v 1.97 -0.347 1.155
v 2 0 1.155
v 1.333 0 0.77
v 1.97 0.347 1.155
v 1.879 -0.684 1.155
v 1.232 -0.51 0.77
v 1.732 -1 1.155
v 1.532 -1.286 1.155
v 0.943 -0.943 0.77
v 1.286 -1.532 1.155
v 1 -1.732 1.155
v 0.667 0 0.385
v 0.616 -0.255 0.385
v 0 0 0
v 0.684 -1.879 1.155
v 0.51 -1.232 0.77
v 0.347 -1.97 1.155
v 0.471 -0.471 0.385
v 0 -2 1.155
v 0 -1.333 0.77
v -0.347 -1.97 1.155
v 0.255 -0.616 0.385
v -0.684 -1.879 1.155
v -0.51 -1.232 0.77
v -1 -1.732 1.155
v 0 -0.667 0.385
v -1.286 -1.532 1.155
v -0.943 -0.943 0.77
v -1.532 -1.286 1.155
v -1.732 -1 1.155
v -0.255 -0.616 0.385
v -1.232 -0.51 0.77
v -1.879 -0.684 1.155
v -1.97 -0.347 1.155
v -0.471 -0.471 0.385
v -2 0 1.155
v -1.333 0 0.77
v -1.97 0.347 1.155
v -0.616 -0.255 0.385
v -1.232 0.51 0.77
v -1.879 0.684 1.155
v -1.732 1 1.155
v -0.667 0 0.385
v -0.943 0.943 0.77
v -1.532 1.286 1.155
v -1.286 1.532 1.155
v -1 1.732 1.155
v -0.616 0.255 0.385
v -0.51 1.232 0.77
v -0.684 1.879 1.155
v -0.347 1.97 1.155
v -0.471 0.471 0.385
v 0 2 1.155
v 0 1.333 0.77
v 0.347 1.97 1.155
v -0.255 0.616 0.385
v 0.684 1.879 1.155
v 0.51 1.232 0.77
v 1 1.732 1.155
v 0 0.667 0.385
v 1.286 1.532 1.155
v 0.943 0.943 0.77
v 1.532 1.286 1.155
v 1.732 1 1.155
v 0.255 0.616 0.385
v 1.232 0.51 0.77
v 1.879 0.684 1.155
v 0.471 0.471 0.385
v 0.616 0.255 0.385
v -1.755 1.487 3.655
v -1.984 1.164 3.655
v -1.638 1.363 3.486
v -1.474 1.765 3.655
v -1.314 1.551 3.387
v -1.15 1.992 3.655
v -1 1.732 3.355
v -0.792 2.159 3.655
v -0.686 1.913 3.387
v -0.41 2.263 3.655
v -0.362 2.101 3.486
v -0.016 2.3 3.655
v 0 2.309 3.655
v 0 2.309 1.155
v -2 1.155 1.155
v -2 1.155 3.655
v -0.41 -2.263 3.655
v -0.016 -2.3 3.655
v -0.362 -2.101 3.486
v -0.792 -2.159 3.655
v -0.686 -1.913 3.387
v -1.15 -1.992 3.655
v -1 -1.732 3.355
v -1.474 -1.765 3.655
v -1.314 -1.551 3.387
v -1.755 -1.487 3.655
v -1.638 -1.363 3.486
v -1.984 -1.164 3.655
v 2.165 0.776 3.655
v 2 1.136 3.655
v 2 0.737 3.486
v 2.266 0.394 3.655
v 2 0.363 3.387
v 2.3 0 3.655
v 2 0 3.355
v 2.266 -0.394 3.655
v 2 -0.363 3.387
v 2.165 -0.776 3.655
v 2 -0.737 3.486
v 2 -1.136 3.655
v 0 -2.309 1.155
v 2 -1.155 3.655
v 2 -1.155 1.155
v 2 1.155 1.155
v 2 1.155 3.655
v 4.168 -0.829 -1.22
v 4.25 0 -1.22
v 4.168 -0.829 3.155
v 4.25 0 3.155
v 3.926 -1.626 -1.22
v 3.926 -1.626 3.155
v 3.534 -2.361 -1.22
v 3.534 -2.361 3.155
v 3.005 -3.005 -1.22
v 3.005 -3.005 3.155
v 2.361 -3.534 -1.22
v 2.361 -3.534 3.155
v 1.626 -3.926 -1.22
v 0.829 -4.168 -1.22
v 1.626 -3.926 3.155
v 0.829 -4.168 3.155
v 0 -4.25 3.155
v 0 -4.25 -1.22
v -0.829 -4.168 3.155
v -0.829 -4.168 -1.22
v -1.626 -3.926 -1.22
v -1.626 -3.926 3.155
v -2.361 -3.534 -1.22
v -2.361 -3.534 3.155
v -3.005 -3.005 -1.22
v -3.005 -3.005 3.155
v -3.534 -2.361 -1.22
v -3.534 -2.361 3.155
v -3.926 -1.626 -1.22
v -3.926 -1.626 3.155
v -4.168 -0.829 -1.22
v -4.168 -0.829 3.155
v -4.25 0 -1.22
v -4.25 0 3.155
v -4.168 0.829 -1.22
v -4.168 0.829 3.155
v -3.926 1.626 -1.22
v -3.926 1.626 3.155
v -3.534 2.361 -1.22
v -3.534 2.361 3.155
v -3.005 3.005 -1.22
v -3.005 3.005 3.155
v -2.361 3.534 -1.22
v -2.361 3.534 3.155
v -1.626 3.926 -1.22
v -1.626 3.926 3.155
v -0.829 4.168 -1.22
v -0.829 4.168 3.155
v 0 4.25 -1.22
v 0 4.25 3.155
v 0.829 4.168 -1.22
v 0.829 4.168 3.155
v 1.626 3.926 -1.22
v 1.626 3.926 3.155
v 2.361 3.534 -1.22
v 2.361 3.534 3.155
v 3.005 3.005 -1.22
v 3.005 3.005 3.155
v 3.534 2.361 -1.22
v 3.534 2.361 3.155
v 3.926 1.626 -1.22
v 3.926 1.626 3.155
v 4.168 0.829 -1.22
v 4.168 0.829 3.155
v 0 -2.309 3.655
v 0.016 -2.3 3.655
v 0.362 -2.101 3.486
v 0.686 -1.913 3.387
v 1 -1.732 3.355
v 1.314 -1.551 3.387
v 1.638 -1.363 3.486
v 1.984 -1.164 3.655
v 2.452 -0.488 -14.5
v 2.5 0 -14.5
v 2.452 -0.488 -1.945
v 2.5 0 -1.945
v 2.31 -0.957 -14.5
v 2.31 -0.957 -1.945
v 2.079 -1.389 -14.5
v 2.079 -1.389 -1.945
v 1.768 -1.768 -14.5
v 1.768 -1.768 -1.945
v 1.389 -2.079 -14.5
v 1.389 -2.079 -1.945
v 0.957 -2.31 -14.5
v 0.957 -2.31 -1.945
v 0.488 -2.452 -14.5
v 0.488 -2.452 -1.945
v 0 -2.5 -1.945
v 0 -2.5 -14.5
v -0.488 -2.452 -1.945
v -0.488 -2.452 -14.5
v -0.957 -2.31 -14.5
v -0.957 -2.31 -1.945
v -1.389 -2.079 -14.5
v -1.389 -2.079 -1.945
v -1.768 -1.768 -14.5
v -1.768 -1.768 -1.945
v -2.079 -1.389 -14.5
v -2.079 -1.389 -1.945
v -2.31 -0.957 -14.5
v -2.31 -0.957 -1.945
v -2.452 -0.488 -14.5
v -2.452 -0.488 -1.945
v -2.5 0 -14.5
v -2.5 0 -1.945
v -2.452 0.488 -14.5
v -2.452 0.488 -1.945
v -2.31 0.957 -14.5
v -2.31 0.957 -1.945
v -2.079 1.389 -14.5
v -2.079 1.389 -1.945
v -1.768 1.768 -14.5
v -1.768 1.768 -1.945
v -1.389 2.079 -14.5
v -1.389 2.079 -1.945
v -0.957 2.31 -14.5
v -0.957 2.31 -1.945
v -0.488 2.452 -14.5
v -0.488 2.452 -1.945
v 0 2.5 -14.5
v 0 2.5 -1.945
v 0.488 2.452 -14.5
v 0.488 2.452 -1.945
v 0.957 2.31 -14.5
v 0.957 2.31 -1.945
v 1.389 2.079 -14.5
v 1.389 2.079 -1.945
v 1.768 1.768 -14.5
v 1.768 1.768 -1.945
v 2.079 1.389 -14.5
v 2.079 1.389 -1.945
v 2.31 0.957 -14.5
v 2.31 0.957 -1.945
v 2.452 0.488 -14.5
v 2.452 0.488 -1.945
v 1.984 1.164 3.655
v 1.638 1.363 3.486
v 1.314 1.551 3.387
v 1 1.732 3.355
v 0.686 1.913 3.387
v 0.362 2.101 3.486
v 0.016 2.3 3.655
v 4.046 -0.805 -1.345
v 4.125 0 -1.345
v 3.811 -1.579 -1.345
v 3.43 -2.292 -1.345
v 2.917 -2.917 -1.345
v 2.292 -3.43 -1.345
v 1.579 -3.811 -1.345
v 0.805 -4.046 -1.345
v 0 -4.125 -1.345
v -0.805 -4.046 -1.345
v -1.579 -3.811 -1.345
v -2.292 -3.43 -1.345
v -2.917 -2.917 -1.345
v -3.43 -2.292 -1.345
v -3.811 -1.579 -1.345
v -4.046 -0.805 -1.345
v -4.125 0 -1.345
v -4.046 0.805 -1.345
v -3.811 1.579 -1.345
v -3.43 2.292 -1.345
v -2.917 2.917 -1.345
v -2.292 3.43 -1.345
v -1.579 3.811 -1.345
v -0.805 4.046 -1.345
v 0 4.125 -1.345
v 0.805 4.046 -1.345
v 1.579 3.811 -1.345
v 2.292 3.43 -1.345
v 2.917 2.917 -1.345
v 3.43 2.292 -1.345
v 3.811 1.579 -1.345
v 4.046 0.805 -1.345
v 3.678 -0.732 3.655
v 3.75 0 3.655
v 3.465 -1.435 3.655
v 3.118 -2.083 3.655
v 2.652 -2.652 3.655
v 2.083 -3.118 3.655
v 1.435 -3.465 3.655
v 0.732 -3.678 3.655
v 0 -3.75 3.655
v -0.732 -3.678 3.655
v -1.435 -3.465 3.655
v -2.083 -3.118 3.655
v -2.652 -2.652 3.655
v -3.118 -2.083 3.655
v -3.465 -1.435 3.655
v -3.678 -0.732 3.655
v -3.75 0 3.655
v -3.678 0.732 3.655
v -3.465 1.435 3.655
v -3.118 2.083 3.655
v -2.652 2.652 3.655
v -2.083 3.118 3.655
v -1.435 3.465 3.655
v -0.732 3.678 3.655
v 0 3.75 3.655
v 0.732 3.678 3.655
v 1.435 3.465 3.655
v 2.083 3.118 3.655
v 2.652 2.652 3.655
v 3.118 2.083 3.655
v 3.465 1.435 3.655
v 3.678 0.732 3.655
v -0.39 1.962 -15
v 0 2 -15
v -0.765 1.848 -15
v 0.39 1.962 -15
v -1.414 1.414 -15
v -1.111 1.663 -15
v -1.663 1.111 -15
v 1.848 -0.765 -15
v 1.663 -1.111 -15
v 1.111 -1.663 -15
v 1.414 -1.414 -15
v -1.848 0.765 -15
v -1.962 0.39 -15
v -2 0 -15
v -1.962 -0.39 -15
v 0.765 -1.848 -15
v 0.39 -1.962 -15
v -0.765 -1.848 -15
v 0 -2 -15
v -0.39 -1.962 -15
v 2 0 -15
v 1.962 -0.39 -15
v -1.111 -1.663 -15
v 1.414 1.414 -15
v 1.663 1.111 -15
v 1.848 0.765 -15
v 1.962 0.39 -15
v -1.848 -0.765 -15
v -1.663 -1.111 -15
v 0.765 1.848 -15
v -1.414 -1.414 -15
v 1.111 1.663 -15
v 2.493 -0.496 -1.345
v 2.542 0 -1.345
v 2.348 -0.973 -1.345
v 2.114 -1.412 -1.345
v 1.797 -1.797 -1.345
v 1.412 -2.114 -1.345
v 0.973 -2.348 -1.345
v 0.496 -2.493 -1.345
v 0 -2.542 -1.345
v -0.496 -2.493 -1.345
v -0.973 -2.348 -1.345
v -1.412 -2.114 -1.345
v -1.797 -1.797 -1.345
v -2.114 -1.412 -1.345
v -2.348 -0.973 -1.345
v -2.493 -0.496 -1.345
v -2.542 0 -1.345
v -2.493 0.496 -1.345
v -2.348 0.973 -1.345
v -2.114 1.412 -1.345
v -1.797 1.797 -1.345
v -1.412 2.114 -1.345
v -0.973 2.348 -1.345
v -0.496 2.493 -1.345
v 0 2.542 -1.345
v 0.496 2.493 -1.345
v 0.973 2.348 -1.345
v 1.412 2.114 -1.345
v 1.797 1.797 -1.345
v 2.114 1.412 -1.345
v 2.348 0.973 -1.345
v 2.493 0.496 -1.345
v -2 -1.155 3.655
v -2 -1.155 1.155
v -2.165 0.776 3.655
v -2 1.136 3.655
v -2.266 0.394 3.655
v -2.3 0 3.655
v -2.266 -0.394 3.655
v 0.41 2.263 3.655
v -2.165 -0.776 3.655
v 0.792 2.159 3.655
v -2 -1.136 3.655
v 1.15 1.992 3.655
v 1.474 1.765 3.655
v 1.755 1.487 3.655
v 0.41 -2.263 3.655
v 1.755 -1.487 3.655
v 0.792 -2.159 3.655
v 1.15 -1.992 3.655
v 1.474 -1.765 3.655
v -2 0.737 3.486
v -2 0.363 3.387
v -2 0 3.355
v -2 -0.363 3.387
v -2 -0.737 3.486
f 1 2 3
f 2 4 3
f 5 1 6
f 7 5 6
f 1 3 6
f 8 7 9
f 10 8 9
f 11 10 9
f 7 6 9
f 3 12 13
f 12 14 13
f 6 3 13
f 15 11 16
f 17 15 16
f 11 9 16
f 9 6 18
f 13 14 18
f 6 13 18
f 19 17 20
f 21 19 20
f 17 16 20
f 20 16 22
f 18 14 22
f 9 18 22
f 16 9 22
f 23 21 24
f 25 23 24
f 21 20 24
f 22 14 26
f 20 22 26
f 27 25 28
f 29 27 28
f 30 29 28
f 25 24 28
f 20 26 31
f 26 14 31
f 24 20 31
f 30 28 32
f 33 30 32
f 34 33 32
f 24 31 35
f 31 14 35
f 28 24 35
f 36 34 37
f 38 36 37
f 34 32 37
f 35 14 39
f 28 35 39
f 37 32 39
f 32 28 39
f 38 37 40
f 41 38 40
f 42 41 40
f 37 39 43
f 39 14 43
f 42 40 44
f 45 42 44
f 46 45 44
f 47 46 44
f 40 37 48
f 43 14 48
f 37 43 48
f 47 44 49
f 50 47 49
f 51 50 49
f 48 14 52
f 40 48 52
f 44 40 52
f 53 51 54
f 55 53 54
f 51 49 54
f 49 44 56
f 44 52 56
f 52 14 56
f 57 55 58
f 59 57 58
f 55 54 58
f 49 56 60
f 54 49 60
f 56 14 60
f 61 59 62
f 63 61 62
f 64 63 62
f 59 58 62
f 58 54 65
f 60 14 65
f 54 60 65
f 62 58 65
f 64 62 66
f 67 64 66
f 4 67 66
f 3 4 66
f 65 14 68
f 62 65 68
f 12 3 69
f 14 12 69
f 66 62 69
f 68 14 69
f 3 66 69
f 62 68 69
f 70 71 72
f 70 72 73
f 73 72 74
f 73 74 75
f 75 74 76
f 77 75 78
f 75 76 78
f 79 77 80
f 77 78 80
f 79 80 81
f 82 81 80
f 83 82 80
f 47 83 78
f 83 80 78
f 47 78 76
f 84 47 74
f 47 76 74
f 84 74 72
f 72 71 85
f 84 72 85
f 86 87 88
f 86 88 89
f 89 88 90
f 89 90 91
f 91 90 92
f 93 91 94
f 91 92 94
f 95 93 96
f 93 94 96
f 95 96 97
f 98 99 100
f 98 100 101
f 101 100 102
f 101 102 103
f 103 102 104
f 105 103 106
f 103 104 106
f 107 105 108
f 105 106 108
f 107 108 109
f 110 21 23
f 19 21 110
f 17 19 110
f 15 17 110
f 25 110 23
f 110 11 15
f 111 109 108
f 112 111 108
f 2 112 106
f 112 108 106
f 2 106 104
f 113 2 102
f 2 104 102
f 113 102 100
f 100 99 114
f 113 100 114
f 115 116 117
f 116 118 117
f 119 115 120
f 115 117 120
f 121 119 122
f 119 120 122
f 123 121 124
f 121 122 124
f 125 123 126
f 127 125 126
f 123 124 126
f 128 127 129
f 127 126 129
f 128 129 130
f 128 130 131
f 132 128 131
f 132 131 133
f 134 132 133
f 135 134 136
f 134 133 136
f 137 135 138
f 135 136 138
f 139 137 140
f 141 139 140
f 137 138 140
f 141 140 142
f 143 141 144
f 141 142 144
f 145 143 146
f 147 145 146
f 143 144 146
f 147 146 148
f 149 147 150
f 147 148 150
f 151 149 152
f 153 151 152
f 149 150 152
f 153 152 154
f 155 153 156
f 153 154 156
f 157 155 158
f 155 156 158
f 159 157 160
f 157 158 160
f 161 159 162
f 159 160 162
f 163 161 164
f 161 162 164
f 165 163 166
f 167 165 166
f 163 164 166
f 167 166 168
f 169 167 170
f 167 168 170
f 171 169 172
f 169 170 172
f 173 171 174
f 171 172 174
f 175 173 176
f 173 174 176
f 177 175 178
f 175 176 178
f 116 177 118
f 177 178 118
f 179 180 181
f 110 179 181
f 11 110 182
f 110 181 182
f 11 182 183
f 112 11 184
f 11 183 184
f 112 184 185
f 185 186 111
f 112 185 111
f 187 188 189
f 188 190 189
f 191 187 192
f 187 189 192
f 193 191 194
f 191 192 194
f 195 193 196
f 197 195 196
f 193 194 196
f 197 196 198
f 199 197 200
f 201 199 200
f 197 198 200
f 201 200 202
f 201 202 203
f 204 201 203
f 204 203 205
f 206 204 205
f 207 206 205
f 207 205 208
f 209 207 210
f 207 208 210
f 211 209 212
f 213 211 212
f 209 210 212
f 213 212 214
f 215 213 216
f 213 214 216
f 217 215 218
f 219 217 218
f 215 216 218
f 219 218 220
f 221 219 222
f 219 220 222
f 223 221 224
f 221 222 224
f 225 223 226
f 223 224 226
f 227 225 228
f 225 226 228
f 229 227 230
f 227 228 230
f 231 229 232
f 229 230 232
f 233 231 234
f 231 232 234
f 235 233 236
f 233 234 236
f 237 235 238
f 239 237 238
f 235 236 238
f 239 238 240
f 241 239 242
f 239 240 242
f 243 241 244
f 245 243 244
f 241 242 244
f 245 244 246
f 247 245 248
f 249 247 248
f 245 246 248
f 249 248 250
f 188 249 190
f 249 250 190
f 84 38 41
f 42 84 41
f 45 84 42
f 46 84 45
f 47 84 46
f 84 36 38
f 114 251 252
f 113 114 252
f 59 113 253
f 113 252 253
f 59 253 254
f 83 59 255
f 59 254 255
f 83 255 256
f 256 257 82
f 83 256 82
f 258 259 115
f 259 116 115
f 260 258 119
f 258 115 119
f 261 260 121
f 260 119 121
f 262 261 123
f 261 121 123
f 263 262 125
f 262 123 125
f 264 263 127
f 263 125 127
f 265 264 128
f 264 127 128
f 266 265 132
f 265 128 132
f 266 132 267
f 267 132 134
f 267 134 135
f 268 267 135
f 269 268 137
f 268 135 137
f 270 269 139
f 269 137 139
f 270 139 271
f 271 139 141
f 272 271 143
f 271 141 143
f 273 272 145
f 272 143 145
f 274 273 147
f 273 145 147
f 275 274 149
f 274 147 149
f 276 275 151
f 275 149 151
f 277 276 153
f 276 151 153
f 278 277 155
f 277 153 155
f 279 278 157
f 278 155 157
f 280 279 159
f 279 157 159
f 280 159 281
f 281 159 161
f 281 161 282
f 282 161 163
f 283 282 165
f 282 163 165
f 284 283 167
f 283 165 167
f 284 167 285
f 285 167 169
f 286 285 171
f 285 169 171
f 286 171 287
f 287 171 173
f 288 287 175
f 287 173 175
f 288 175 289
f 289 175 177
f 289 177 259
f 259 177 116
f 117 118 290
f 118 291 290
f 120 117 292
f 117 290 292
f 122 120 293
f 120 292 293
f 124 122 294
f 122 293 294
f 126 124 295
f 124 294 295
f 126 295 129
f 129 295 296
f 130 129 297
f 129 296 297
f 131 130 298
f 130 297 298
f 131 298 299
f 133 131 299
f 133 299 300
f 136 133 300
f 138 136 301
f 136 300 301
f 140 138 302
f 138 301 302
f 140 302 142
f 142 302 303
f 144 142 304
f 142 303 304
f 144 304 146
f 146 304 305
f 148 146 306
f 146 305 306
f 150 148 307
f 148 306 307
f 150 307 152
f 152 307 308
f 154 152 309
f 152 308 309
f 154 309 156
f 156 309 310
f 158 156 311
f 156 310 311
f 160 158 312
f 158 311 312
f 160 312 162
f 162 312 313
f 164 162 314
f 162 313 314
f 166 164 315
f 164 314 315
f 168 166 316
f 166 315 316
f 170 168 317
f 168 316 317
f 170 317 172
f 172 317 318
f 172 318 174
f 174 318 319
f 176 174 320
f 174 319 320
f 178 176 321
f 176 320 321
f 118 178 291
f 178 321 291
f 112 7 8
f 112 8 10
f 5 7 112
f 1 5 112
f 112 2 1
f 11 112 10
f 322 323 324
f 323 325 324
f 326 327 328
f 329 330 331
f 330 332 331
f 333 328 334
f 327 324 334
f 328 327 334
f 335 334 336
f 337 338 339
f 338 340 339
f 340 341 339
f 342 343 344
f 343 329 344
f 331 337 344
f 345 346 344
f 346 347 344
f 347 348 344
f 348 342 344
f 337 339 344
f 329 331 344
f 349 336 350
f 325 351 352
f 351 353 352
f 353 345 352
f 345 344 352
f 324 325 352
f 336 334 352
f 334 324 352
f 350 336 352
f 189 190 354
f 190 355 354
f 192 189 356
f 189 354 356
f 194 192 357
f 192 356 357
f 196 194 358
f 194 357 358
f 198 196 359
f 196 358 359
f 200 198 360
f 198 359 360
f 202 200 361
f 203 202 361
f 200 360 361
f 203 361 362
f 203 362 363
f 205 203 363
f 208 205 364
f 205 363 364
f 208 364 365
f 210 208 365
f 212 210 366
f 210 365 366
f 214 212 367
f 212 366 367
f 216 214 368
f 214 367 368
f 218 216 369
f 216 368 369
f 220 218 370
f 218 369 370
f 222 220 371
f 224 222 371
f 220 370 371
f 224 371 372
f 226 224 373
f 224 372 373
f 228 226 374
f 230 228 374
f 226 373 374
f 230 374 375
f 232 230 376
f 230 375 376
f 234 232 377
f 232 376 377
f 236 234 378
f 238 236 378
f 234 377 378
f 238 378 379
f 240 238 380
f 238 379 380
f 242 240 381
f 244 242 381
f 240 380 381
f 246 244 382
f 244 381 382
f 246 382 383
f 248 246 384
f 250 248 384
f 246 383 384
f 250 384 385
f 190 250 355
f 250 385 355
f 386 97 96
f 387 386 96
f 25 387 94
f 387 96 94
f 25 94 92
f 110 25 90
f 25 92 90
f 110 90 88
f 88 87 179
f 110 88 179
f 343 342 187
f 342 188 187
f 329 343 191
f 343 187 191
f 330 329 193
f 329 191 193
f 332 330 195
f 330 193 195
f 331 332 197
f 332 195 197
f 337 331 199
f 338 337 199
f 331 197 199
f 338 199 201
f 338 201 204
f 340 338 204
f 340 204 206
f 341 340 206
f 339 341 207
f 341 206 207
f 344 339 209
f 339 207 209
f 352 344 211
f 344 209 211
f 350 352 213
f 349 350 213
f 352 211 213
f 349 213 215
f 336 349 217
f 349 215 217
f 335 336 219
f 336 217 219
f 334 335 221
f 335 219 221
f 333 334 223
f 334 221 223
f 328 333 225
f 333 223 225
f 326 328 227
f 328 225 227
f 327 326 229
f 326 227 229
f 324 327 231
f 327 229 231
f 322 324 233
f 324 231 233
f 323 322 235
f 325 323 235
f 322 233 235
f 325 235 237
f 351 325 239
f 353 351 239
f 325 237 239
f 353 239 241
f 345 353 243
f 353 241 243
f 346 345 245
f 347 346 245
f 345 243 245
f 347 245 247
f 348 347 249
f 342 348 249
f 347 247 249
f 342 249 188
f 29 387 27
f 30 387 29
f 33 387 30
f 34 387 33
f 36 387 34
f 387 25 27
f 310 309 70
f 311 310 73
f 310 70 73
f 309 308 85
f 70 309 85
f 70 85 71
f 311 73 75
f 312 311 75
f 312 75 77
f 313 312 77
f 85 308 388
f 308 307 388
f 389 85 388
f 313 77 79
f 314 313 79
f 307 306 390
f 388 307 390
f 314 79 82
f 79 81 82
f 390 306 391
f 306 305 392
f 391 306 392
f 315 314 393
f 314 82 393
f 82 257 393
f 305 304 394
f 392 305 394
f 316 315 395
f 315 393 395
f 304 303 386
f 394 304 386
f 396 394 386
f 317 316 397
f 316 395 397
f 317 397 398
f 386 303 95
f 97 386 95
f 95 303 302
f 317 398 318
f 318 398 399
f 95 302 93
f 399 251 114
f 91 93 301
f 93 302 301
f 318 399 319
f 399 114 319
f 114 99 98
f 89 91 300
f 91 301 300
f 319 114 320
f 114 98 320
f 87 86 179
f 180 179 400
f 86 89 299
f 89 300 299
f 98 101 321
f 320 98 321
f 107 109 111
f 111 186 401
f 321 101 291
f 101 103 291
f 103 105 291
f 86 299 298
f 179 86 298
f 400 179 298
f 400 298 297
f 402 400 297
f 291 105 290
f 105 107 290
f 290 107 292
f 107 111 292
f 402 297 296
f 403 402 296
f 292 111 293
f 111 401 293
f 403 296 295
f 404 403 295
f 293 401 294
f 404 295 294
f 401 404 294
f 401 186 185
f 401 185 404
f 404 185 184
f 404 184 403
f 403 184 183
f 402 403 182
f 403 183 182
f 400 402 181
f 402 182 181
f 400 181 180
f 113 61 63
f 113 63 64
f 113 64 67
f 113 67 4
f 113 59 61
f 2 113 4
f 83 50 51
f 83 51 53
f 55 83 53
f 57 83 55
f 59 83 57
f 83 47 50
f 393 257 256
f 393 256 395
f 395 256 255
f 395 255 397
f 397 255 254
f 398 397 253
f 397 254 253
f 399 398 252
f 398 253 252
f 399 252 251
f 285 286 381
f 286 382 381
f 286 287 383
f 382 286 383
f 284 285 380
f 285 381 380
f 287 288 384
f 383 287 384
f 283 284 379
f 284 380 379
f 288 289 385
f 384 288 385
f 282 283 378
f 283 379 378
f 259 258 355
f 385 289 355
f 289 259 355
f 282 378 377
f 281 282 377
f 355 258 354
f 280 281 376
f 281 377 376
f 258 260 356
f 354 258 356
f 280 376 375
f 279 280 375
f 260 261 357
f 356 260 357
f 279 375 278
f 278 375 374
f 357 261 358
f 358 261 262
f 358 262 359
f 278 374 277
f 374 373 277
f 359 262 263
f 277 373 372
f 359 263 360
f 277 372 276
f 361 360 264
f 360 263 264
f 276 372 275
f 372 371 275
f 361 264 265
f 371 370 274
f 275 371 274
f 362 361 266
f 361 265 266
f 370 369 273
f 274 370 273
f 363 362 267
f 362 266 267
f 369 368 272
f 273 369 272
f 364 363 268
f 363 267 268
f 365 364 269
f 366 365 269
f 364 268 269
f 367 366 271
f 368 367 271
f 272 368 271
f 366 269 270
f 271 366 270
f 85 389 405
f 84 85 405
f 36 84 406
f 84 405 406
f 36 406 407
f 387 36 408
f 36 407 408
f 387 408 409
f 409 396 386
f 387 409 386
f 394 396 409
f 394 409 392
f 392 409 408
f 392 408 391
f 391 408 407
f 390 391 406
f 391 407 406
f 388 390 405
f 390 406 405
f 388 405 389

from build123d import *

# Parameters (mm, degrees)
CORTAR_EXTRUIR1_DEPTH = 2.5


with BuildPart() as part:
    # Croquis1 → Revolución1 (revolve)
    with BuildSketch(Plane(origin=(0, 0, 0), x_dir=(0, 0, -1), z_dir=(1, 0, 0)), mode=Mode.PRIVATE) as revoluci_n1_sk:
        Polygon((0, 0), (15, 0), (15, 2), (14.5, 2.5), (1.945299462, 2.5), (1.345299462, 2.541956087), (1.345299462, 4.125), (1.220299462, 4.25), (-3.154700538, 4.25), (-3.654700538, 3.75), (-3.654700538, 2.3), (-3.354700538, 2), (-1.154700538, 2), align=None)
    revolve(revoluci_n1_sk.sketch.rotate(Axis((0, 0, 0), (0, 0, -1)), 90), axis=Axis((0, 0, 0), (0, 0, -1)))

    # Croquis2 → Cortar-Extruir1 (cut)
    with BuildSketch(Plane.XY.offset(3.654700538)):
        Polygon((0, 2.309401077), (-2, 1.154700538), (-2, -1.154700538), (0, -2.309401077), (2, -1.154700538), (2, 1.154700538), align=None)
    extrude(amount=-CORTAR_EXTRUIR1_DEPTH, mode=Mode.SUBTRACT)


solid = part.part
